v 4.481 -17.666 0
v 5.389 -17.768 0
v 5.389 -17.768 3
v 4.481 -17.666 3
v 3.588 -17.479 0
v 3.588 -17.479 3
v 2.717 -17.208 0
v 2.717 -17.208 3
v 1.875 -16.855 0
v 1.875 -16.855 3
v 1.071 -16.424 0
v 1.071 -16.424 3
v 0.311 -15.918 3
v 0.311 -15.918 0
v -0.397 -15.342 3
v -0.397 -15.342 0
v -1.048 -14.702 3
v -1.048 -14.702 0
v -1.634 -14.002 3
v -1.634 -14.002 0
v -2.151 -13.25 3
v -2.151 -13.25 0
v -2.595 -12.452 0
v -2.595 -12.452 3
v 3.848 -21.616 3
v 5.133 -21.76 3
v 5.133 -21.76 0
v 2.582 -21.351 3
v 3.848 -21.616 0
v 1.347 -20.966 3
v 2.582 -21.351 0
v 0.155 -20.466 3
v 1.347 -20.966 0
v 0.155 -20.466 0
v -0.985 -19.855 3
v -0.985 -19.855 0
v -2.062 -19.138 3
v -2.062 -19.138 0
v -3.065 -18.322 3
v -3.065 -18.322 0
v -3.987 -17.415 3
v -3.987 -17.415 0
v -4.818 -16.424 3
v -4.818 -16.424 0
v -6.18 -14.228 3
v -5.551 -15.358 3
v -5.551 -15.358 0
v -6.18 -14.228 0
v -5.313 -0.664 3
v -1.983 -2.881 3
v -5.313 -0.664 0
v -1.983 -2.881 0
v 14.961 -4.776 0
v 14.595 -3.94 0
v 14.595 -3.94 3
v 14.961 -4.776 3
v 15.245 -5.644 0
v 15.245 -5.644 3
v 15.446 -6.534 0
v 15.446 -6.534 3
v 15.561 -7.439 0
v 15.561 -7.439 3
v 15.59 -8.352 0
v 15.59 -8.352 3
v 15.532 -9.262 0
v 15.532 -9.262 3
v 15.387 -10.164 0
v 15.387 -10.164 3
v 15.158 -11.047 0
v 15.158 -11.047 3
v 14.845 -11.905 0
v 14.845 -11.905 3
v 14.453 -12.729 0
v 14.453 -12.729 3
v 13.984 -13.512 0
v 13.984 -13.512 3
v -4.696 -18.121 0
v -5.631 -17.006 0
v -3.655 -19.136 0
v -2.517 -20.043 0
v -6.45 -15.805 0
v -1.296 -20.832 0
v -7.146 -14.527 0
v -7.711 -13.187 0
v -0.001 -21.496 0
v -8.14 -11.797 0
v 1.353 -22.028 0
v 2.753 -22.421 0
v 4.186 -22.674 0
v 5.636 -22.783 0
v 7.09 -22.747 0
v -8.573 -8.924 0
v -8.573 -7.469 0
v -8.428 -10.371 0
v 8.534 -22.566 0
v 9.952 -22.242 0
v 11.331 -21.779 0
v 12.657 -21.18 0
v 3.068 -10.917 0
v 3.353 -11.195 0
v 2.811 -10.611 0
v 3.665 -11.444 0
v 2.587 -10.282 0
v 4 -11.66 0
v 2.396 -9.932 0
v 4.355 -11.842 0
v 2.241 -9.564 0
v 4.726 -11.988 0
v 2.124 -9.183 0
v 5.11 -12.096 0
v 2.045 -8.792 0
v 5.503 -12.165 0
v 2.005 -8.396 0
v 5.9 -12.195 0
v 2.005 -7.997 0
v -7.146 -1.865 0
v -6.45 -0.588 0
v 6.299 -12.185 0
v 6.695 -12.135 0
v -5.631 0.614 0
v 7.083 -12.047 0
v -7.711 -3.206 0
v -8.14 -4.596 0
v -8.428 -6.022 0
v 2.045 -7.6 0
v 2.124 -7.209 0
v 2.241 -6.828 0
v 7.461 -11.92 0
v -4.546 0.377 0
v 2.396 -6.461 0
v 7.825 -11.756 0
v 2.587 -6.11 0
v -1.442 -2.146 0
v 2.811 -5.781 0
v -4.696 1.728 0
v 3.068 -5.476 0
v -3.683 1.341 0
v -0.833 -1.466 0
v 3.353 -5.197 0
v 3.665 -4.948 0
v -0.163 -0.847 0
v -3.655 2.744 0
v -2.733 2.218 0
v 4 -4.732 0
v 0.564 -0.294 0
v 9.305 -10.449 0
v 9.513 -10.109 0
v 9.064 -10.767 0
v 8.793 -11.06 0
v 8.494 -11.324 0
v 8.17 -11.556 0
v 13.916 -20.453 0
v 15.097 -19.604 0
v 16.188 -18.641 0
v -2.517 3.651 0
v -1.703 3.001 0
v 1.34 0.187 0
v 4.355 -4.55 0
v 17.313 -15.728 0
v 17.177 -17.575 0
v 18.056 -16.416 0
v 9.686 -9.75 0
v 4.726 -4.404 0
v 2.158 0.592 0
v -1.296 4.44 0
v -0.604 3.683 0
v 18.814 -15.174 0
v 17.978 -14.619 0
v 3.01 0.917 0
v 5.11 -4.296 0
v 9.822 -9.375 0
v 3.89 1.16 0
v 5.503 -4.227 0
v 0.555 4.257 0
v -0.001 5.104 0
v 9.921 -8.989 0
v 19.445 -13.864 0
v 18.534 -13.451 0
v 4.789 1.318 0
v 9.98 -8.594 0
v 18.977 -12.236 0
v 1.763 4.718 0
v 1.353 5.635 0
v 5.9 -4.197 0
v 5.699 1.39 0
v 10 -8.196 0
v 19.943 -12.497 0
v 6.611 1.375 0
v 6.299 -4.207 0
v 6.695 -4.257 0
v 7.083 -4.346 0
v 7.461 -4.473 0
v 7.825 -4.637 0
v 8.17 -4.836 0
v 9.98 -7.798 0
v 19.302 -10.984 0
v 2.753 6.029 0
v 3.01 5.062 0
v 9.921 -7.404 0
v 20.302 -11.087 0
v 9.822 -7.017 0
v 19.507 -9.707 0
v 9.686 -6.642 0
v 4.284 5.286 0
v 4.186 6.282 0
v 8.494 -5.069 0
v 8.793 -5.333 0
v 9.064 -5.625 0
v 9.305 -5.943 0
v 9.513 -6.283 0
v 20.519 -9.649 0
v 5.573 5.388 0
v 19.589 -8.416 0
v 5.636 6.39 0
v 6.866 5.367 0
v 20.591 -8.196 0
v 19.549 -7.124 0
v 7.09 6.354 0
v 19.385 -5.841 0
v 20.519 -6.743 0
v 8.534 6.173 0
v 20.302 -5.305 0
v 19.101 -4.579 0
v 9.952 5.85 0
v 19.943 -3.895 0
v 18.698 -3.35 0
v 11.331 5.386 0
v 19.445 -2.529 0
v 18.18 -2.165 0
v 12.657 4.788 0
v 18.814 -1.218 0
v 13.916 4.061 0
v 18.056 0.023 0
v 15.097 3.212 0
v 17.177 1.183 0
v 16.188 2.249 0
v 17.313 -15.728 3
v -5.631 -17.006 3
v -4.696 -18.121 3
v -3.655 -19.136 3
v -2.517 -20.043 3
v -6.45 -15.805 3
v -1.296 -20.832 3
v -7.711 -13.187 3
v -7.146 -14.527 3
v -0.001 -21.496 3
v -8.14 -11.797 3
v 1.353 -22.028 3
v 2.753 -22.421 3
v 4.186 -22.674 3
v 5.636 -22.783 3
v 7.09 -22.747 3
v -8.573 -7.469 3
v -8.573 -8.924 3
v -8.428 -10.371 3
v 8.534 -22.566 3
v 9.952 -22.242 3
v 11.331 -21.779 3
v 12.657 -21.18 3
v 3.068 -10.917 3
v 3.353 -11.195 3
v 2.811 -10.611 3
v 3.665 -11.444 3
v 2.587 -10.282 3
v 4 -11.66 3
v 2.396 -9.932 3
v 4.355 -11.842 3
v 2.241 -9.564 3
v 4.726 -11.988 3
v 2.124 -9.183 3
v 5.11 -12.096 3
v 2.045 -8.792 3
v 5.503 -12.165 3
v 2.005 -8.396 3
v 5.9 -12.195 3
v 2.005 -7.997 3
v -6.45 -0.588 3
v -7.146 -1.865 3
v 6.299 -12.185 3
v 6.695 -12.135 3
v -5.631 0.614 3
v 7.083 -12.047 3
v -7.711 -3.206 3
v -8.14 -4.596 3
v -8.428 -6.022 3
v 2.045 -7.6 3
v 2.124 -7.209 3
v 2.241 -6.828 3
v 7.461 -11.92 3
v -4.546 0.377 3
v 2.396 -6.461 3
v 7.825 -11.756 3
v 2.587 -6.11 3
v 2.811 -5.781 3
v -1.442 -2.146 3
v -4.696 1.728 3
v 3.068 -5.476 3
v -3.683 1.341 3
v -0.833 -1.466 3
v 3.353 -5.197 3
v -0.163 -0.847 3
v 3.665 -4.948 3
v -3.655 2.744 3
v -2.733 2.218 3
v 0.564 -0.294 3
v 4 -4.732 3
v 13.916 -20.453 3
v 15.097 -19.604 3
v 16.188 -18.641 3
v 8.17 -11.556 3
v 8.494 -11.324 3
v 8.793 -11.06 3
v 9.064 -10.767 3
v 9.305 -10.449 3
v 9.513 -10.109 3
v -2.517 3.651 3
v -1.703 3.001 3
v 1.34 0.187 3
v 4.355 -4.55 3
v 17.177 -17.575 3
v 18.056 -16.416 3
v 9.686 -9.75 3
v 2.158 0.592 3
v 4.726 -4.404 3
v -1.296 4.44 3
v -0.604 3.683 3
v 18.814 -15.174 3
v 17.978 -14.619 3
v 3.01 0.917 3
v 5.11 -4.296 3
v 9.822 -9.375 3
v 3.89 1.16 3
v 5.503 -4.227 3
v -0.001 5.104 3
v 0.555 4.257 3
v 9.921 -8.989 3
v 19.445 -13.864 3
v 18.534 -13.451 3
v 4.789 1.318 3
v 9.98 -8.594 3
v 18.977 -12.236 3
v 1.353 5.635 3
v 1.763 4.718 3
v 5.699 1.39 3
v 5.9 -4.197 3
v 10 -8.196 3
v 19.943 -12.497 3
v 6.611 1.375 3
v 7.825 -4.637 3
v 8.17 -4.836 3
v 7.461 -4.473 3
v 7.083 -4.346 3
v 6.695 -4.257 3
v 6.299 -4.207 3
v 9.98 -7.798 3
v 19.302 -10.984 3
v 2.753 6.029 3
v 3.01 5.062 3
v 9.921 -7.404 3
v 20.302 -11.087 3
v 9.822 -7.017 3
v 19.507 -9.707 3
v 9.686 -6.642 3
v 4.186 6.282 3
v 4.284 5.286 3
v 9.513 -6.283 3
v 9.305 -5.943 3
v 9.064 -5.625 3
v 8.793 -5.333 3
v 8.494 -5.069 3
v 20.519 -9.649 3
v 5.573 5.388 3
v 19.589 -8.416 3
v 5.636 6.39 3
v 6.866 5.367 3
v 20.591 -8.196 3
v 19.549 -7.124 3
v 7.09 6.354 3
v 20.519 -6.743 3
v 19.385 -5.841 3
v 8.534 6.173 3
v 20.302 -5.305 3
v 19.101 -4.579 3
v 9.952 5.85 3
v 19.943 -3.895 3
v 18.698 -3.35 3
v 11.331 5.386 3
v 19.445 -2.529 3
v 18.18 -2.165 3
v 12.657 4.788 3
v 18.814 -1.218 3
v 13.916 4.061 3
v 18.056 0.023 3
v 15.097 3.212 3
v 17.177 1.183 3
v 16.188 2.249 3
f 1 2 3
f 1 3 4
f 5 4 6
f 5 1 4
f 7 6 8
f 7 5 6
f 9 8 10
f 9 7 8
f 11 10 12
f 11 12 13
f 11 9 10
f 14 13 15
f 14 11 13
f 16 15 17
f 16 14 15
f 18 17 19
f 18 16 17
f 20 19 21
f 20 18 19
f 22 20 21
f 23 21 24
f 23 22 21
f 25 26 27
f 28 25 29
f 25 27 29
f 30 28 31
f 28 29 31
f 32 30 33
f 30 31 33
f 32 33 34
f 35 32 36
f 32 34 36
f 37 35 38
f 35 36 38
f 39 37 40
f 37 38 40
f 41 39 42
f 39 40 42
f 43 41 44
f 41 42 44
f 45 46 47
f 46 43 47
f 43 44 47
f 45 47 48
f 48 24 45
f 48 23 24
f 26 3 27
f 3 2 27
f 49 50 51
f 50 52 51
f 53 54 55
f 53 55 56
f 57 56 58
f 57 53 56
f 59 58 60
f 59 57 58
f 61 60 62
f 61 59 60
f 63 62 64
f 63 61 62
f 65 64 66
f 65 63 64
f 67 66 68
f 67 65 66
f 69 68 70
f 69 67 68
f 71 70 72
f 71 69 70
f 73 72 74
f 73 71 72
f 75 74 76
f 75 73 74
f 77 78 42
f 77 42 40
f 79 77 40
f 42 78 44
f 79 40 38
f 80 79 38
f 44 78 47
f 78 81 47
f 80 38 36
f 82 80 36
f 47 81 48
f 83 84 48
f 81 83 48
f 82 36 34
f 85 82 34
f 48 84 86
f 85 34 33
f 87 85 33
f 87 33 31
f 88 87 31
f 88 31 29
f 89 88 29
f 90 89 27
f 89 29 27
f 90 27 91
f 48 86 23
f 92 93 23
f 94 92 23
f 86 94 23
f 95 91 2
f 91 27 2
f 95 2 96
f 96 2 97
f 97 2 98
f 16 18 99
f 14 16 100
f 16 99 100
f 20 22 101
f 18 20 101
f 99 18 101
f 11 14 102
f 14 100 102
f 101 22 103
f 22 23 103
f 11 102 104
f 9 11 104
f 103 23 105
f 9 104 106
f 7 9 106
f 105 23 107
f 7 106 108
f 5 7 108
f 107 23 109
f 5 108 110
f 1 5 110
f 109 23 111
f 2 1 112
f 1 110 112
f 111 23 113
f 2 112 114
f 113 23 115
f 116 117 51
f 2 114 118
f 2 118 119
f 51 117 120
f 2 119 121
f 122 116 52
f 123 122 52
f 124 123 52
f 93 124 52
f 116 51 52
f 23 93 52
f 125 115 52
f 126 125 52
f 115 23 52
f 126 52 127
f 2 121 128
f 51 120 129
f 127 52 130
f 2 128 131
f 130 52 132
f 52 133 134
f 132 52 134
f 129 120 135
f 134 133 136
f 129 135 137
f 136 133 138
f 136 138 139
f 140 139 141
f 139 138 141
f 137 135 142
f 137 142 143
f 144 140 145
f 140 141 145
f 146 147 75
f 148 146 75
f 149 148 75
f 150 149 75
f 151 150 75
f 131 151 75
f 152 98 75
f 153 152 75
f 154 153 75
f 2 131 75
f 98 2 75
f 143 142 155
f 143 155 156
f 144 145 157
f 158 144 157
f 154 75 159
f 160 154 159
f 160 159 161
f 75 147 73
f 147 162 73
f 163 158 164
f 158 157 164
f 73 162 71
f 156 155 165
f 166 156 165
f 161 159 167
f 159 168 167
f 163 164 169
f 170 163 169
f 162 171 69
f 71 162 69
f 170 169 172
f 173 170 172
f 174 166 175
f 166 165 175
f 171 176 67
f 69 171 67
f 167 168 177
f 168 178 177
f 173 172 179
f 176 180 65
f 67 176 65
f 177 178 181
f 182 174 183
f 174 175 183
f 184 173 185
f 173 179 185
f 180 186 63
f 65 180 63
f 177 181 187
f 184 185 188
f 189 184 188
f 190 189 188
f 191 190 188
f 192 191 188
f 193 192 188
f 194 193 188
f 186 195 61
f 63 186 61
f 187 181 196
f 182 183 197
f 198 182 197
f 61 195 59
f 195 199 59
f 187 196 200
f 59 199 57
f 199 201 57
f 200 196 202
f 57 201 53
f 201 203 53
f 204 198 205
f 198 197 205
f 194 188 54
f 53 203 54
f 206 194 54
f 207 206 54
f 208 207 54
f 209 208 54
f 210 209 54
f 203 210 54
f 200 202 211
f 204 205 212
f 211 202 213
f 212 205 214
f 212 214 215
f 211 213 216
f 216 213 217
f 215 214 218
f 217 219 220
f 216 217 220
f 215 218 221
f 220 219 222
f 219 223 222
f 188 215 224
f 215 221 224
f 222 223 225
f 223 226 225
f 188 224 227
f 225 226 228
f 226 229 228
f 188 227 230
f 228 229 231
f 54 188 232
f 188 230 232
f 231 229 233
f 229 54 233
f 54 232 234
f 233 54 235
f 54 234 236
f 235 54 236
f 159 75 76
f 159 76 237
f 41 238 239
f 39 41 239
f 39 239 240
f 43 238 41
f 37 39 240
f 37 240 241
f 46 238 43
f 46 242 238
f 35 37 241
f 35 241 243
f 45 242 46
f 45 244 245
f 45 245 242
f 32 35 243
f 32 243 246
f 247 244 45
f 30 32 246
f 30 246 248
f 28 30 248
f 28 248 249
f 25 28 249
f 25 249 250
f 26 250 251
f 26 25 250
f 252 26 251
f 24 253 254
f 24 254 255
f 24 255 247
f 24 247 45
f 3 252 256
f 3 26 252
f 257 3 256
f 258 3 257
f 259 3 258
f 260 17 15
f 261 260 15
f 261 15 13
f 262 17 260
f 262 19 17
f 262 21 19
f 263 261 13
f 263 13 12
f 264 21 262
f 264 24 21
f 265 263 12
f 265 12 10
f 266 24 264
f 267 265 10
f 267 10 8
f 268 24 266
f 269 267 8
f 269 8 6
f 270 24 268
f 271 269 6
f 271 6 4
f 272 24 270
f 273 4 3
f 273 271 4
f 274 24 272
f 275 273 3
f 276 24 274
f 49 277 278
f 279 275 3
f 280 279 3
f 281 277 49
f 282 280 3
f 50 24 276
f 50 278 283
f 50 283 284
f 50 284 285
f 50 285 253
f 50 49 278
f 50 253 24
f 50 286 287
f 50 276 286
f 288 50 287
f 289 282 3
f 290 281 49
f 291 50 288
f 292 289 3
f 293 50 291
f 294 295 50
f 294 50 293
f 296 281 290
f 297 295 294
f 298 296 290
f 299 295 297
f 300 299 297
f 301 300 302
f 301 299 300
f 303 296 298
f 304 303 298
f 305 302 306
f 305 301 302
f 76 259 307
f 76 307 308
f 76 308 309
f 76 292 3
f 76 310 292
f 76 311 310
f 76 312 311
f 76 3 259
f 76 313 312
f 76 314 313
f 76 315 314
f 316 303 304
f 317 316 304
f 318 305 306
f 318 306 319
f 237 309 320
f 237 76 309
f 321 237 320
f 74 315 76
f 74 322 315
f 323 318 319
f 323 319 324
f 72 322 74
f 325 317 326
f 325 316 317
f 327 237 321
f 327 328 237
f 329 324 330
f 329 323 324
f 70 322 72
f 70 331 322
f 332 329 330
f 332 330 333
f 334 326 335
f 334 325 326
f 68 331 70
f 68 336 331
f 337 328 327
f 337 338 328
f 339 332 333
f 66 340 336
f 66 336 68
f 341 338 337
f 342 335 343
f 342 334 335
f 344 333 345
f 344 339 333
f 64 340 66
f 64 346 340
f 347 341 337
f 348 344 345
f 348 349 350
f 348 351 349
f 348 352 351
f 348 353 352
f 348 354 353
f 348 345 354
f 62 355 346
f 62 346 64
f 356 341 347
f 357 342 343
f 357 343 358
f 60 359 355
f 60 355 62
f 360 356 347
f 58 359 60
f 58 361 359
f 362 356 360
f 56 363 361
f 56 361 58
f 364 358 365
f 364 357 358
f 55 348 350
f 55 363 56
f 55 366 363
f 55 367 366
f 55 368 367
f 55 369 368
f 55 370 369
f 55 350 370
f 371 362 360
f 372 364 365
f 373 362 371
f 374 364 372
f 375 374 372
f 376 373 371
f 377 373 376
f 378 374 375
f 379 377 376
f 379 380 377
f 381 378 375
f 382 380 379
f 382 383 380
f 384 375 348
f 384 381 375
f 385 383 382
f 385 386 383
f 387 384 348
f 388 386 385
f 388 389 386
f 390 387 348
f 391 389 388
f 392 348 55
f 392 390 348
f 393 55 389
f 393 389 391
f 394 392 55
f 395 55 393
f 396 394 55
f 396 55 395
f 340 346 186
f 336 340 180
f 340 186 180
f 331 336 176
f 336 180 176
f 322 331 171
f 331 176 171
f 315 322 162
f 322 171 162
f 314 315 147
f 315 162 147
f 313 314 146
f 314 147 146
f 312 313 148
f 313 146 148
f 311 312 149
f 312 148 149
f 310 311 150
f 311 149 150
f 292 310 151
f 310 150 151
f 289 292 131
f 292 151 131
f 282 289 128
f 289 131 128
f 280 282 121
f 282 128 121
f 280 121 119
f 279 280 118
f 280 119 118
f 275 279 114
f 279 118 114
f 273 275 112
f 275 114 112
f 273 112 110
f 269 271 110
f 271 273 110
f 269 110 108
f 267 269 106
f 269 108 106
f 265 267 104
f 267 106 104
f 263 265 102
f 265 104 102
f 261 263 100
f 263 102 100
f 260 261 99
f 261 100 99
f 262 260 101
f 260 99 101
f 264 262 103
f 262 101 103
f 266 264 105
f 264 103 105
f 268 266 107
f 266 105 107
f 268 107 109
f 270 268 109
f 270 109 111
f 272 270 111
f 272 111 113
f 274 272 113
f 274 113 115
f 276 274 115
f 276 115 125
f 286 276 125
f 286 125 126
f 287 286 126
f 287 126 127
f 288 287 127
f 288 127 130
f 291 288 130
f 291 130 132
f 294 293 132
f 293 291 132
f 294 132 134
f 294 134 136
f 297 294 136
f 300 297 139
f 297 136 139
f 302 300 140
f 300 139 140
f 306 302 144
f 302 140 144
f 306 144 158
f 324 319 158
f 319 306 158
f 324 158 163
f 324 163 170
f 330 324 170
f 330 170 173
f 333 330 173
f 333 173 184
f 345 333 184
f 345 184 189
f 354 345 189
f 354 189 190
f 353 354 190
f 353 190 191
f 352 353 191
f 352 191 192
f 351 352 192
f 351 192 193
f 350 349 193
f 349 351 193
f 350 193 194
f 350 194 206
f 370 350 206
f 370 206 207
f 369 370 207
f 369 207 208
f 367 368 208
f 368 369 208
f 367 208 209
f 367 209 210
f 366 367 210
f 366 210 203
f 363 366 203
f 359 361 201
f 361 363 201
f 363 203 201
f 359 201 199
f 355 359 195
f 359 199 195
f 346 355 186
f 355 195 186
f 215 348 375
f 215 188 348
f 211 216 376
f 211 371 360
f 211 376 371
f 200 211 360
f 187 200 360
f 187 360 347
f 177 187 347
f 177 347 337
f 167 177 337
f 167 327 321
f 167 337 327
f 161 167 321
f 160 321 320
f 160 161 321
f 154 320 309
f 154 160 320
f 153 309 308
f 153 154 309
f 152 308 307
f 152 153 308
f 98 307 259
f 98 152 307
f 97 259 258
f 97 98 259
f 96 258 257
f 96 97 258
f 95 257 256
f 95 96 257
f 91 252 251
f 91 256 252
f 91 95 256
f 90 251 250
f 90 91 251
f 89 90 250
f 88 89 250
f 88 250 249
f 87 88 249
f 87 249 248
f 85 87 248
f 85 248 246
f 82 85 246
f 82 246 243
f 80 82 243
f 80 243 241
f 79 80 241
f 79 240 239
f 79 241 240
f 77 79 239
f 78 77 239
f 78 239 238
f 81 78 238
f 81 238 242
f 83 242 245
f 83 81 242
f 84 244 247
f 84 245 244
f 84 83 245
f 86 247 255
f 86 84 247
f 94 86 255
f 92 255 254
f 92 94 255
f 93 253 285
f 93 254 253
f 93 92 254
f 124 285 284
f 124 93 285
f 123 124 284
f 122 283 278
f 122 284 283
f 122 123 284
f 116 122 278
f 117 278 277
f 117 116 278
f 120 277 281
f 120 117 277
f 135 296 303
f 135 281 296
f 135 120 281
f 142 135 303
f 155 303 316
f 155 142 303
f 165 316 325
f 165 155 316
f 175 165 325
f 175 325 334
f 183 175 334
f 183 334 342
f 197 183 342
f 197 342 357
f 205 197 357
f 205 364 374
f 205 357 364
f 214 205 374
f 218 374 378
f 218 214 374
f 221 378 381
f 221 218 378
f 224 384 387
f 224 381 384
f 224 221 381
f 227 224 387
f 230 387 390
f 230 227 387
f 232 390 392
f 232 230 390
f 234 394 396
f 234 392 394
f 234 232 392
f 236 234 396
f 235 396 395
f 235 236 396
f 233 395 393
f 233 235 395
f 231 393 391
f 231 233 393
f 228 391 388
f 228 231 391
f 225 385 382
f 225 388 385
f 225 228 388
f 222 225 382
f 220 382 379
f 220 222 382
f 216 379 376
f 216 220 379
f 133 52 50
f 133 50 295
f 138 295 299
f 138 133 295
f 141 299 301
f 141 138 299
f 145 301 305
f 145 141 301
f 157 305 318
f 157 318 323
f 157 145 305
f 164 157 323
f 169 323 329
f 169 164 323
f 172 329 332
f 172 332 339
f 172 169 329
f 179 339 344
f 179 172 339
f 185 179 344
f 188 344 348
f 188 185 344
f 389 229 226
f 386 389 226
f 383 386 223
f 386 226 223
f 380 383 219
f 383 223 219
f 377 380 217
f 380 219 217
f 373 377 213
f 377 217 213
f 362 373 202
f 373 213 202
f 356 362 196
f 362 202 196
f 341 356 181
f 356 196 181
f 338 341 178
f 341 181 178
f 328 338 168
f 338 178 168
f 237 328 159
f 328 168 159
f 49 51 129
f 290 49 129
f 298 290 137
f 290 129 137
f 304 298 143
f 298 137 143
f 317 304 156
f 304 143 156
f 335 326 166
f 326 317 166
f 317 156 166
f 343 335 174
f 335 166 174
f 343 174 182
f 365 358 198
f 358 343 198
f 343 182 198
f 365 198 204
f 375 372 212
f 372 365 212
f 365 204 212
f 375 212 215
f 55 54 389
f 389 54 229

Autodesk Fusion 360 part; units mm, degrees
sketch "Sketch17" plane through (0, 0, 0) normal (0, 0, 1) x (1, 0, 0)
  line L0 (0, 0) -> (0, 10)
  line L1 (0, 10) -> (6, 10)
  line L2 (6, 10) -> (6, 0)
  line L3 (6, 0) -> (0, 0)
  line L4 (0, 8) -> (6, 8)
  line L5 (3, 8) -> (3, 0)
  line L6 (3, 0) -> (3, 3)
  circle A0 centre (3, 3) radius 1
  line L7 (12, 10) -> (12, 0)
  line L8 (9, 0) -> (9, 3)
  line L9 (9, 8) -> (9, 0)
  line L10 (6, 8) -> (12, 8)
  circle A1 centre (9, 3) radius 1
  line L11 (12, 0) -> (6, 0)
  line L12 (6, 0) -> (6, 10)
  line L13 (6, 10) -> (12, 10)
  dimension "d299" = 10
  dimension "d300" = 6
  dimension "d301" = 3
  dimension "d302" = 2
  dimension "d308" = 10
  dimension "d309" = 6
  dimension "d310" = 3
  dimension "d311" = 2
  dimension "d333" = 6
sketch "Sketch18" plane through (0, 0, 0) normal (0, 0, 1) x (1, 0, 0)
  circle A0 centre (6, -8.1962) radius 11.5911
  circle A1 centre (6, -8.1962) radius 13.5911
  circle A2 centre (6, -8.1962) radius 9.5911
  line L0 (6, -8.1962) -> (-5.3131, -0.664)
  circle A3 centre (6, -8.1962) radius 14.5911
  line L1 (6, -8.1962) -> (-6.1795, -14.2275)
  circle A4 centre (6, -8.1962) radius 4
  point P0 (3, 3)
  point P1 (9, 3)
  point P2 (3, 3)
  point P3 (3, 3)
  point P4 (9, 3)
  point P5 (3, 3)
  dimension "d337" = 23.1822
  dimension "d339" = 11.5911
  dimension "d340" = 11.5911
  dimension "d341" = 27.1822
  dimension "d342" = 19.1822
  dimension "d347" = 29.1822
  dimension "d351" = 60
  dimension "d352" = 8
extrude "Extrude45" add sketch "Sketch18" along normal blind 3 contours A0 A2 L0 L1 | A0 A1 L0 L1 picked at (-3.6109, -3.0615) picked at (-5.0902, -1.6236) makes body 1
pattern_circular "C-Pattern13" count 3 over 360 about axis through (6, -8.1962, 0) along (0, 0, 1) of bodies 1 makes body 2 at (9.9587, -19.7633, 0) makes body 3 at (15.3213, -0.2851, 0)
extrude "Extrude46" add sketch "Sketch18" along normal blind 3 contours A2 L0 L1 A4 | A2 L0 L1 A4 | A3 bodies 1 2 3
equation "Enkoder_Kanal_Yüksekliği = 4 mm"
equation "Enkoder_Kanal_Sayısı = 3"
equation "Enkoder_Kanal_Çarpanı = 0"
equation "Enkoder_Sensör_Aralığı = 6 mm"
equation "milçapı = 8 mm"
equation "Enkoder_Kalınlığı = 3 mm"
equation "d333 = sensörAralığı"
equation "d337 = Enkoder_Sensör_Aralığı / 2 / ( sin(( ( 360 / Enkoder_Kanal_Sayısı / 2 * ( 2 * Enkoder_Kanal_Çarpanı + 1 ) / 2 ) / 2 ) * 1 deg) ) * 2"
equation "d339 = Enkoder_Sensör_Aralığı / 2 / ( sin(( ( 360 / Enkoder_Kanal_Sayısı / 2 * ( 2 * Enkoder_Kanal_Çarpanı + 1 ) / 2 ) / 2 ) * 1 deg) )"
equation "d340 = Enkoder_Sensör_Aralığı / 2 / ( sin(( ( 360 / Enkoder_Kanal_Sayısı / 2 * ( 2 * Enkoder_Kanal_Çarpanı + 1 ) / 2 ) / 2 ) * 1 deg) )"
equation "d341 = Enkoder_Sensör_Aralığı / 2 / ( sin(( ( 360 / Enkoder_Kanal_Sayısı / 2 * ( 2 * Enkoder_Kanal_Çarpanı + 1 ) / 2 ) / 2 ) * 1 deg) ) * 2 + Enkoder_Kanal_Yüksekliği"
equation "d342 = Enkoder_Sensör_Aralığı / 2 / ( sin(( ( 360 / Enkoder_Kanal_Sayısı / 2 * ( 2 * Enkoder_Kanal_Çarpanı + 1 ) / 2 ) / 2 ) * 1 deg) ) * 2 - Enkoder_Kanal_Yüksekliği"
equation "d343 = Enkoder_Kalınlığı"
equation "d345 = Enkoder_Kanal_Sayısı"
equation "d347 = Enkoder_Sensör_Aralığı / 2 / ( sin(( ( 360 / Enkoder_Kanal_Sayısı / 2 * ( 2 * Enkoder_Kanal_Çarpanı + 1 ) / 2 ) / 2 ) * 1 deg) ) * 2 + Enkoder_Kanal_Yüksekliği + 2 mm"
equation "d348 = Enkoder_Kalınlığı"
equation "d351 = ( 360 / Enkoder_Kanal_Sayısı / 2 ) * 1 deg"
equation "d352 = milçapı"
